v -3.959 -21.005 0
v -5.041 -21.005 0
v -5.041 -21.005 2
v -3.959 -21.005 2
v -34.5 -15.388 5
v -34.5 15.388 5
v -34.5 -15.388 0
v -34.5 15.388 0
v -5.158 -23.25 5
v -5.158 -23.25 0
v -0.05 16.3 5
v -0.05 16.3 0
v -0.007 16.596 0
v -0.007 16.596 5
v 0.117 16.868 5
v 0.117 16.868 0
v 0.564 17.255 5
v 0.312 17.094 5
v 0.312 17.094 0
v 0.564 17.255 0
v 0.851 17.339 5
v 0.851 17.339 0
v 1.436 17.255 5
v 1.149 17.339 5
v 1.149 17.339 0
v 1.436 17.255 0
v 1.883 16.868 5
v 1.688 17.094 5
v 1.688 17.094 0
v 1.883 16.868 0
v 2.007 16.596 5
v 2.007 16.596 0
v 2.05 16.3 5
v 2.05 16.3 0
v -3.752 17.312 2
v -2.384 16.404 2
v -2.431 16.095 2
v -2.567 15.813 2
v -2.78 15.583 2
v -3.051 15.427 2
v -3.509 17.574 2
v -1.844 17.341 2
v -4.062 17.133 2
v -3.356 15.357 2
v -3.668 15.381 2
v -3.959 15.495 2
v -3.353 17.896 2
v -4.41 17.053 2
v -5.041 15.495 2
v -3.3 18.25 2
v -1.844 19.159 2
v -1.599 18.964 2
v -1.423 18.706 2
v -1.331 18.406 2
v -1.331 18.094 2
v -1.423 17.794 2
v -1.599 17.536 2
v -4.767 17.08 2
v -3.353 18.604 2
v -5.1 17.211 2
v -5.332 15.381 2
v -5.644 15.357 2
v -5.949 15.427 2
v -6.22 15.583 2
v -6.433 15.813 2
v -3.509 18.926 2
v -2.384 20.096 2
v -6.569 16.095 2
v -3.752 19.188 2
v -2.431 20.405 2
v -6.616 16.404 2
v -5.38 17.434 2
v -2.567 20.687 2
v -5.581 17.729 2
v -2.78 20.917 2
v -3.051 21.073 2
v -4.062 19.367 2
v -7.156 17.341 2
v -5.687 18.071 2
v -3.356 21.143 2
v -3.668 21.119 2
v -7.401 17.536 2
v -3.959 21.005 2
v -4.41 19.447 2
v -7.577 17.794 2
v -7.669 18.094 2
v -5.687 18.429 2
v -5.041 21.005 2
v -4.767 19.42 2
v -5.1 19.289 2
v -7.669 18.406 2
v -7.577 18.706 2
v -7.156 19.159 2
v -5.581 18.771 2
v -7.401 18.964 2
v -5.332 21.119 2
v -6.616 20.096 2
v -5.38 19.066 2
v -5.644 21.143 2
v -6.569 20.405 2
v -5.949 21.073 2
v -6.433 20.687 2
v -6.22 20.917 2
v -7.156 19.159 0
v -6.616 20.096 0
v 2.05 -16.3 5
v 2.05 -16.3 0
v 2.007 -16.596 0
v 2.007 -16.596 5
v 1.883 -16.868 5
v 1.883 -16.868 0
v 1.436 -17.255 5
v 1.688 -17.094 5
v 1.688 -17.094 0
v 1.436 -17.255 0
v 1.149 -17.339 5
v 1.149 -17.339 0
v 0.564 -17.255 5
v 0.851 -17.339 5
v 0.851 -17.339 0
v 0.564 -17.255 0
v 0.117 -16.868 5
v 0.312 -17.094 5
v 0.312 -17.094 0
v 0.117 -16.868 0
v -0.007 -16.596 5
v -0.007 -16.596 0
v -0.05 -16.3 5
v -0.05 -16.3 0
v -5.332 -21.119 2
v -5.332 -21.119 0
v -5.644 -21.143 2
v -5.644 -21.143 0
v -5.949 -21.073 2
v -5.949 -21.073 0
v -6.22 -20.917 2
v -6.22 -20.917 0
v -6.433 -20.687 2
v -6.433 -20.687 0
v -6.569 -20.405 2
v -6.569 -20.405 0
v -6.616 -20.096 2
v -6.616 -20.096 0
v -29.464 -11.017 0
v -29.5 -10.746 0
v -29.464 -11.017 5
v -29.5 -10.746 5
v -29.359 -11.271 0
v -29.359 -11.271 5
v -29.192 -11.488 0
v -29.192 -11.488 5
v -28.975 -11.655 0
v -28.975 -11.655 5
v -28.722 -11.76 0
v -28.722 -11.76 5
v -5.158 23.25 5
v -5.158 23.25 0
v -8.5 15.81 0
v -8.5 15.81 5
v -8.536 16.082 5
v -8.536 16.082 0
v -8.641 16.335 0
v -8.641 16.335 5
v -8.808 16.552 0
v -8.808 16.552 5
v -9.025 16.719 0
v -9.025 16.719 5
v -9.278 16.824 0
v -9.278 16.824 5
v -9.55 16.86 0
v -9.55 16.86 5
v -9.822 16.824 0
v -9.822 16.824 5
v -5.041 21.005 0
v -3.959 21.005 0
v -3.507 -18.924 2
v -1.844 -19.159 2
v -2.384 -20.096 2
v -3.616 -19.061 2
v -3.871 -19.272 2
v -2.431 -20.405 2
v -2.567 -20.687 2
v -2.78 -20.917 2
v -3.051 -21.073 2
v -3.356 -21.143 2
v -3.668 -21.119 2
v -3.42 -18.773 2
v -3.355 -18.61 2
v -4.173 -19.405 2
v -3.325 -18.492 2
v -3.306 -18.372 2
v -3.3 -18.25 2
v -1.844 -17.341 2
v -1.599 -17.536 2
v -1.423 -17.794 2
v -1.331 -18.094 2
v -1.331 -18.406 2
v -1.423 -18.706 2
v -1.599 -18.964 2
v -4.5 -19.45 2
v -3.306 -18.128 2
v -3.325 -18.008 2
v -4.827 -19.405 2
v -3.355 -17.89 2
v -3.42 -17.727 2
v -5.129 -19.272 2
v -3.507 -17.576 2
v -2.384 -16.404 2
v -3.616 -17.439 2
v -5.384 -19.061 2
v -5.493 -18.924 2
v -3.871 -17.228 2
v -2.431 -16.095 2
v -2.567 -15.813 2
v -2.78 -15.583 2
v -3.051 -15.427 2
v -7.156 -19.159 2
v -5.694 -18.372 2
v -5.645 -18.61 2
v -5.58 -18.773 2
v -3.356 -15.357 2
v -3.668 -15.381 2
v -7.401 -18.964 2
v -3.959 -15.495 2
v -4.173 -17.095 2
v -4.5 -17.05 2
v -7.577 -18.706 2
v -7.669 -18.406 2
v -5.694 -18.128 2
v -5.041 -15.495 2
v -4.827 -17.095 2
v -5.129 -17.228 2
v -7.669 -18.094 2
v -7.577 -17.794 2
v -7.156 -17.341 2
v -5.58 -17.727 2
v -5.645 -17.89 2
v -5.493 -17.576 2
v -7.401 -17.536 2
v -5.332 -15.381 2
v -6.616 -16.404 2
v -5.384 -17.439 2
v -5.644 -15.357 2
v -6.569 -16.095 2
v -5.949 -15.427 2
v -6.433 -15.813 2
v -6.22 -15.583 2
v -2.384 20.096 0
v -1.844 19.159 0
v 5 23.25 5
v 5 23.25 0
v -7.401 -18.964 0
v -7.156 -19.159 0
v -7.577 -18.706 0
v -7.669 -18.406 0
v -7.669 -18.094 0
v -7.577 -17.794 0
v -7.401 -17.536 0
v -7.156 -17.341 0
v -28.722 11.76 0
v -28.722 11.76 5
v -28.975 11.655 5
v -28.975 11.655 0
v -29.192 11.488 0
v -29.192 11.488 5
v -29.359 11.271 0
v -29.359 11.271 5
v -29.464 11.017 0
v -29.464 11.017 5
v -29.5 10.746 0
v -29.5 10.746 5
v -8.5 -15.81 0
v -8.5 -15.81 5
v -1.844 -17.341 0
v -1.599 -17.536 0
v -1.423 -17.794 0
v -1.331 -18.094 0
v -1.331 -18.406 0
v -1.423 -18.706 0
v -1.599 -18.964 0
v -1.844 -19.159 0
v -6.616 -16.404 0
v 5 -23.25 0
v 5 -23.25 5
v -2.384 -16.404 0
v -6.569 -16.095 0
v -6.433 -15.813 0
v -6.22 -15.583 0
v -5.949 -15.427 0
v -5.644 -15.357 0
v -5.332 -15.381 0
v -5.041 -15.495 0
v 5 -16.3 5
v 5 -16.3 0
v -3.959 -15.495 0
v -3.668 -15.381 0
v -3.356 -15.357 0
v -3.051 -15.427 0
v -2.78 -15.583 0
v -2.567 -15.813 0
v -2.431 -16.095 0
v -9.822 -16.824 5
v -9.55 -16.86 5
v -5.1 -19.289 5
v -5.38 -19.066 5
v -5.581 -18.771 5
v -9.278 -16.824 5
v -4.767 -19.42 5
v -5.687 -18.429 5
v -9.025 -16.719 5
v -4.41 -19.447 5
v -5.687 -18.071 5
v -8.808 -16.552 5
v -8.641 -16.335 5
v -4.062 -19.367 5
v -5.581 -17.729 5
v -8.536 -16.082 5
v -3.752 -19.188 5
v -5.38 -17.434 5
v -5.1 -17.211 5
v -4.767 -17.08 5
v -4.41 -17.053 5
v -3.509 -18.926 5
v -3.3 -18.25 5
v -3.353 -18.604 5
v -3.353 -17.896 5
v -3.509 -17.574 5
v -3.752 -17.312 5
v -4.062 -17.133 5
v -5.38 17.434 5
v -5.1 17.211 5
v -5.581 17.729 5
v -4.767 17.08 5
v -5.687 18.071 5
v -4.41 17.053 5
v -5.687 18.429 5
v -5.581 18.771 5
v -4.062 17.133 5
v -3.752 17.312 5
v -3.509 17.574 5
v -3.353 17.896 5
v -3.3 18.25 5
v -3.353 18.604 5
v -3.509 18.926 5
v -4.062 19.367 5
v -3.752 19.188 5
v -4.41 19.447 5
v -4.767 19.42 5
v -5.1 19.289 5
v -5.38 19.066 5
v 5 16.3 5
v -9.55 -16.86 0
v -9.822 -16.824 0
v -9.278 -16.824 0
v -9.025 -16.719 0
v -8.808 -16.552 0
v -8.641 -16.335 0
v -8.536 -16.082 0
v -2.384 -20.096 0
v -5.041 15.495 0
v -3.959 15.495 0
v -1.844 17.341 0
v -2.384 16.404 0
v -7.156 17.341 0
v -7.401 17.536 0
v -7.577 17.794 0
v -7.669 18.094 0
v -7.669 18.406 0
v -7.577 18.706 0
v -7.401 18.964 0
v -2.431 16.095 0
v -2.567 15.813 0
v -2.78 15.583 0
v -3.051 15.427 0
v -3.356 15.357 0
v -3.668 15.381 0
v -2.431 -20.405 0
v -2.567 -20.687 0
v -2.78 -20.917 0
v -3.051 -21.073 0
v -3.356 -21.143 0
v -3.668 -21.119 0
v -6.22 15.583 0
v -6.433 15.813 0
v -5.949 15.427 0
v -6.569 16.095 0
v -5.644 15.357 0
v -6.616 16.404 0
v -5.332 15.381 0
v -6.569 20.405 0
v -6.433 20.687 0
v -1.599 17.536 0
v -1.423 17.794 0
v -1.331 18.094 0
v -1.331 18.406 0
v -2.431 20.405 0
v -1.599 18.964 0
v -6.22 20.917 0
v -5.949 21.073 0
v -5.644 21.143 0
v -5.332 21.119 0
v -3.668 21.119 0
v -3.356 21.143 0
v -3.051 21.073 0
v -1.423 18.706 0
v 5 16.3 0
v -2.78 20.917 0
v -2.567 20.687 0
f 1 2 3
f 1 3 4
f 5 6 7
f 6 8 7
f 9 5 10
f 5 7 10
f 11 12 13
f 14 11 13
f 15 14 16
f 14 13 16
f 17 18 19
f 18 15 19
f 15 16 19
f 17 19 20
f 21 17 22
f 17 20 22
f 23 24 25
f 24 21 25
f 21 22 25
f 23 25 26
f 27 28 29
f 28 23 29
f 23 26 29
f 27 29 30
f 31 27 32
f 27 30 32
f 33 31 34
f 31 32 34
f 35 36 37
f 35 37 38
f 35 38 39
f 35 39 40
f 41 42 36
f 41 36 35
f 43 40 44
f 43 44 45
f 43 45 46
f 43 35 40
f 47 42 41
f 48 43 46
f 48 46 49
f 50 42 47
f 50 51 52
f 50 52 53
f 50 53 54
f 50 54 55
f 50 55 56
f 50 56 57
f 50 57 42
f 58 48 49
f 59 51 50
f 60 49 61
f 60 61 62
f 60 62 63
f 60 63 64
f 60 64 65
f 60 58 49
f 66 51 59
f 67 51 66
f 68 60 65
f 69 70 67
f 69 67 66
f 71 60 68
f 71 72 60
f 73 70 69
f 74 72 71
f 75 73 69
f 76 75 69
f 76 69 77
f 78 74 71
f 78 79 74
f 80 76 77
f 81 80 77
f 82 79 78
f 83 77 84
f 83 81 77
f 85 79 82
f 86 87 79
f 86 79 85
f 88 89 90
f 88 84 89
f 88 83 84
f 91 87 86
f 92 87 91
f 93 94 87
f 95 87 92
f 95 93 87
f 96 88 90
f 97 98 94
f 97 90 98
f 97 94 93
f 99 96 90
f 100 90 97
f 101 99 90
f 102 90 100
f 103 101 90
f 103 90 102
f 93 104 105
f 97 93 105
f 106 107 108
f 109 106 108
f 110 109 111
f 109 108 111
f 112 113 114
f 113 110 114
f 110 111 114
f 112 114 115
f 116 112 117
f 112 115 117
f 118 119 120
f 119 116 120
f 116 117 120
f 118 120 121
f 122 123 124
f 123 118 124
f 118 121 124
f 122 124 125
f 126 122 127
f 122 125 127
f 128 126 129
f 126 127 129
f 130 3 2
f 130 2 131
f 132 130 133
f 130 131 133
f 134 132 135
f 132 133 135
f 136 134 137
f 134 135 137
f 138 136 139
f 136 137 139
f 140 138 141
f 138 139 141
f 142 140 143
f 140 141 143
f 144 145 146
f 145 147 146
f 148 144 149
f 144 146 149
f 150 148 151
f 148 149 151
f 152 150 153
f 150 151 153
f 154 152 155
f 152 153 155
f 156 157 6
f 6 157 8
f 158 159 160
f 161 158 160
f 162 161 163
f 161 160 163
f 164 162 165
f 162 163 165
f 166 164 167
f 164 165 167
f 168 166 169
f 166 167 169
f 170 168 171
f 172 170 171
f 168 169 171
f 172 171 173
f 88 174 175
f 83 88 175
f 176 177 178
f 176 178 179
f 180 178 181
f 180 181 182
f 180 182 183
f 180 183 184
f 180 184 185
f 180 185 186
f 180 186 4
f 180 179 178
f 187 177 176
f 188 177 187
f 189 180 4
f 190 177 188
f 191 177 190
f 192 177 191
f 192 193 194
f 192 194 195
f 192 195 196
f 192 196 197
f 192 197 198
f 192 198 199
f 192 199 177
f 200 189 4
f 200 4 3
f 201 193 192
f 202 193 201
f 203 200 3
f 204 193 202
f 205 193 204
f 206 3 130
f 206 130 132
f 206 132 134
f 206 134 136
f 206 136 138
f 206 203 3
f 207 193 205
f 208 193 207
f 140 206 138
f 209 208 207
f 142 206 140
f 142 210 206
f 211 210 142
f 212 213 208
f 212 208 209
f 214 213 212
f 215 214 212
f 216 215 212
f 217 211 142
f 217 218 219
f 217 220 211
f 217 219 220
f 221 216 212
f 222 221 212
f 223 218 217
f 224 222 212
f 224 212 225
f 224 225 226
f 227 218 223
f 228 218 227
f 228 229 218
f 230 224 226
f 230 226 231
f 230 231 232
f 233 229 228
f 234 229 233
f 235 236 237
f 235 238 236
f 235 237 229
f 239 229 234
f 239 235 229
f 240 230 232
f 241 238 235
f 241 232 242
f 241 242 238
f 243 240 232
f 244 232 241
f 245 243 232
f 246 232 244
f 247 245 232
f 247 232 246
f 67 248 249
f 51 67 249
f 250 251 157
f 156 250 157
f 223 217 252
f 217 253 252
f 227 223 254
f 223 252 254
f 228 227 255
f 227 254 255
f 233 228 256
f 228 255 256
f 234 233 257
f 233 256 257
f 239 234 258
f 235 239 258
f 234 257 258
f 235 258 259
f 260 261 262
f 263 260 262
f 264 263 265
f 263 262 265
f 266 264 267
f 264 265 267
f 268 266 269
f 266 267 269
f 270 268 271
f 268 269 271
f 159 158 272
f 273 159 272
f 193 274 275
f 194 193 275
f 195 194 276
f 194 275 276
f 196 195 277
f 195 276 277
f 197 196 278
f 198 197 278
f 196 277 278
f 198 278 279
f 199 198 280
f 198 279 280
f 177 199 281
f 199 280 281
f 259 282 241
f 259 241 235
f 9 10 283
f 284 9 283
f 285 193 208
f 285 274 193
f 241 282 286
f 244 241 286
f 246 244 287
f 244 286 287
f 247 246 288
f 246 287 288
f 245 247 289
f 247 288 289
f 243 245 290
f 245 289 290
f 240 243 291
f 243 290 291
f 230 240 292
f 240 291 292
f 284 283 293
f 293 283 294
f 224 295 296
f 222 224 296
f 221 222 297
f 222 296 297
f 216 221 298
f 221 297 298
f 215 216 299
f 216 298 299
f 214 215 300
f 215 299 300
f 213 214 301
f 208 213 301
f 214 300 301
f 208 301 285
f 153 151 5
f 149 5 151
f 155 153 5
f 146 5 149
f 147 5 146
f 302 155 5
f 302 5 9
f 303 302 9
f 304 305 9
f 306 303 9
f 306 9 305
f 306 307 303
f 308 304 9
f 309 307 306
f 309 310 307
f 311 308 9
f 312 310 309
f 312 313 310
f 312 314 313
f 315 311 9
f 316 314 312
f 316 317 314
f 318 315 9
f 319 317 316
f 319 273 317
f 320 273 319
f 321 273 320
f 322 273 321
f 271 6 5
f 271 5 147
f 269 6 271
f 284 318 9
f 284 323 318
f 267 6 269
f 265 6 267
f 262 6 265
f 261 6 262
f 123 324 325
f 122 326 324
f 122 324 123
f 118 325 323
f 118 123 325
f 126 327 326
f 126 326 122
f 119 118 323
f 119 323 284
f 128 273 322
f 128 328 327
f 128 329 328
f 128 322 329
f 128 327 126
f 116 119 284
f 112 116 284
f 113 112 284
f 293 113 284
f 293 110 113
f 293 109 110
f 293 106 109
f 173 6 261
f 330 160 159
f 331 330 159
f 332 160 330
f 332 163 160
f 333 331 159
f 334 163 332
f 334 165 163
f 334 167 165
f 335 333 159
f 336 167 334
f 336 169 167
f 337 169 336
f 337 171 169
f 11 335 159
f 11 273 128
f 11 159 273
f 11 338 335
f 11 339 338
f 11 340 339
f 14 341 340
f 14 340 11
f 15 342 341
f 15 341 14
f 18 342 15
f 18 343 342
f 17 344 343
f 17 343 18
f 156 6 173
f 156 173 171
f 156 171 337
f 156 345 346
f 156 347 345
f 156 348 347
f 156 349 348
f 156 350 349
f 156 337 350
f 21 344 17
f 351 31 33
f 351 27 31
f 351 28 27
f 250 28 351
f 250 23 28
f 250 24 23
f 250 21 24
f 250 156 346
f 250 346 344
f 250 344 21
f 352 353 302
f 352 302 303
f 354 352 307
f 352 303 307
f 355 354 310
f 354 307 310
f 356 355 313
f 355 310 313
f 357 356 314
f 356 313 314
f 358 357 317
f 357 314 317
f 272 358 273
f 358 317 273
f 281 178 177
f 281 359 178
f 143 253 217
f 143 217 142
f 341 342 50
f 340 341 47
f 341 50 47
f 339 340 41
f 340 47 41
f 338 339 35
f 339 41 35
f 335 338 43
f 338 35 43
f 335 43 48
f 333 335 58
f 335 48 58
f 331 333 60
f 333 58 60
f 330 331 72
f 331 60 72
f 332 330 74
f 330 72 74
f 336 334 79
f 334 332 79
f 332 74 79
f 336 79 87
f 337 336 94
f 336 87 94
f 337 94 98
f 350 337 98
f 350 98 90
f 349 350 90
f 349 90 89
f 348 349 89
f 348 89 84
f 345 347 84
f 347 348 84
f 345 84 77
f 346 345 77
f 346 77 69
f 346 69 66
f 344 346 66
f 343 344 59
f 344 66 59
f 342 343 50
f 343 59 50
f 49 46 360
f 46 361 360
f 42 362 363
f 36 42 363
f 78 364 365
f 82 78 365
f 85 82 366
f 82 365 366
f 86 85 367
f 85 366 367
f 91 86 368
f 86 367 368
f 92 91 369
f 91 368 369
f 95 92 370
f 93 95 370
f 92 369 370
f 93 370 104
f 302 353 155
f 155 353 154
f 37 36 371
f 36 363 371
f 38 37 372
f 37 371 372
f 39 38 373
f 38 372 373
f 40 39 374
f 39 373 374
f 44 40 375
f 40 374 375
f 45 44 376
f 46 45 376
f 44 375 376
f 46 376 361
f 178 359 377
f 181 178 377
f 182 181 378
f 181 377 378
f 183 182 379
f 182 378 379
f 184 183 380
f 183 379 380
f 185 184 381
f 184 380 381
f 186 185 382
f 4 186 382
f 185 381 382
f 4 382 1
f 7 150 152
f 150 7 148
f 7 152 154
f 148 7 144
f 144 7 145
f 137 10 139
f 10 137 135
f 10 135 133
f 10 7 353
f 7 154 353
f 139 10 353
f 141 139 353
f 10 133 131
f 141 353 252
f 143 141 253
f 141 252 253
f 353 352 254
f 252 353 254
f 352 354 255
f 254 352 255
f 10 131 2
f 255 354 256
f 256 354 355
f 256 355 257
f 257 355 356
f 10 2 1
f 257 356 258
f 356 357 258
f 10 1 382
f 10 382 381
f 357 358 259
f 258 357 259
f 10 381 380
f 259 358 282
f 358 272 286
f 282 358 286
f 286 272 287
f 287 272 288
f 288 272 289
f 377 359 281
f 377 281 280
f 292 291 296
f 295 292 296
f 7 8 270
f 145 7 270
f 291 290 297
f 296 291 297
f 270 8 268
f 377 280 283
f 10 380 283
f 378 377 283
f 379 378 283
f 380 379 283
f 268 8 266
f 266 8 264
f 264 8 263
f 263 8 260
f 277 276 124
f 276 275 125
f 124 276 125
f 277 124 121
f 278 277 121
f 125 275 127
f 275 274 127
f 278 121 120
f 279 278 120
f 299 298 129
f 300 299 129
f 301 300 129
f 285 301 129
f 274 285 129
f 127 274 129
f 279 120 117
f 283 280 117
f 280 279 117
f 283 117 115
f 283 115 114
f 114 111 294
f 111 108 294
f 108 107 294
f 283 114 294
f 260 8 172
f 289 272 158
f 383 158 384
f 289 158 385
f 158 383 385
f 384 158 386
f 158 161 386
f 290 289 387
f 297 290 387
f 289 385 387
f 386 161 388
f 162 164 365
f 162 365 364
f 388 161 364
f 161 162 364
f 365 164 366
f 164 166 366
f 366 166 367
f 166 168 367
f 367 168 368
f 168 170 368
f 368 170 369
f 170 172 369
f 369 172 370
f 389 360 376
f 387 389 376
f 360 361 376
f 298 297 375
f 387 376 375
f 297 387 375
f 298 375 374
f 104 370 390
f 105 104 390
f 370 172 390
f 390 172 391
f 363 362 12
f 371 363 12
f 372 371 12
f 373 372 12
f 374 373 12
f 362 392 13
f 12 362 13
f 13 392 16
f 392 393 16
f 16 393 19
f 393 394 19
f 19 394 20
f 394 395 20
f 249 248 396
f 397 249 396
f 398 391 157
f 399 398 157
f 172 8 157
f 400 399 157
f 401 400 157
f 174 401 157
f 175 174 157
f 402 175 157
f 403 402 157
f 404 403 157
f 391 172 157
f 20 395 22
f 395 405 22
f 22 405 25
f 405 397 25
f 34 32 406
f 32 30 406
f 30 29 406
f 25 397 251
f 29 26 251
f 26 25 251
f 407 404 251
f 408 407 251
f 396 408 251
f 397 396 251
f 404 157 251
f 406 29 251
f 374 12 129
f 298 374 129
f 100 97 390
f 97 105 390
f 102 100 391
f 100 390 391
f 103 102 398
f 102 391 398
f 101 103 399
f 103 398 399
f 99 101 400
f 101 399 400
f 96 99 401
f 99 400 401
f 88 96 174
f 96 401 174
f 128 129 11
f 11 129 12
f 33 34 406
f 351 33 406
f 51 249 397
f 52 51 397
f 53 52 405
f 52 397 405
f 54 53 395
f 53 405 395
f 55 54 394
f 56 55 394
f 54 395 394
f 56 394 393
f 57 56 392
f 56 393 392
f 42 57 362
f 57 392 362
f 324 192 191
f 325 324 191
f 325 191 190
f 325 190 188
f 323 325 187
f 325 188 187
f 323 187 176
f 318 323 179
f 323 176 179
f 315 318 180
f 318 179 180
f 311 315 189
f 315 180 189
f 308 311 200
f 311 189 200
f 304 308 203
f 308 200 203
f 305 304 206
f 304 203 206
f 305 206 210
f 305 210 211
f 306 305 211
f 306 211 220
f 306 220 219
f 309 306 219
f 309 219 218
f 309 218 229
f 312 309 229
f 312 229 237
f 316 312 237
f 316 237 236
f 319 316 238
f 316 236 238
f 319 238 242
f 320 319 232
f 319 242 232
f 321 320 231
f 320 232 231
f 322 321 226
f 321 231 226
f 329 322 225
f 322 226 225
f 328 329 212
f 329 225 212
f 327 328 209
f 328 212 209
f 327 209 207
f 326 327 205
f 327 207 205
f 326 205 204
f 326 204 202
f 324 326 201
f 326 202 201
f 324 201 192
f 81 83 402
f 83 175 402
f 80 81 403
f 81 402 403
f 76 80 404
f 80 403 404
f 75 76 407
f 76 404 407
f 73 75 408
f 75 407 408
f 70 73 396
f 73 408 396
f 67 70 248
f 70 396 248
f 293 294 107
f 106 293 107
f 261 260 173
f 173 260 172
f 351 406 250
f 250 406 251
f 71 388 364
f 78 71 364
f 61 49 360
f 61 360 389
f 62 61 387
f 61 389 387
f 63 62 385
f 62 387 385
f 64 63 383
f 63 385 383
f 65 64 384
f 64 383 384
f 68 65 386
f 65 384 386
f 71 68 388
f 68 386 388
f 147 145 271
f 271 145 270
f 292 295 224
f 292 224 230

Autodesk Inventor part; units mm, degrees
ref_plane "YZ Plane" through (0, 0, 0) normal (1, 0, 0) x (0, 1, 0)
ref_plane "XZ Plane" through (0, 0, 0) normal (0, 1, 0) x (-1, 0, 0)
ref_plane "XY Plane" through (0, 0, 0) normal (0, 0, 1) x (1, 0, 0)
sketch "スケッチ1" plane through (0, 0, 0) normal (0, 0, 1) x (1, 0, 0)
  line L0 (0, 16.25) -> (28.465632, 16.25) construction
  line L1 (28.465632, 16.25) -> (28.465632, -16.25) construction
  line L2 (28.465632, -16.25) -> (0, -16.25) construction
  line L3 (0, -16.25) -> (0, 16.25) construction
  line L4 (5, 23.25) -> (-5.158262, 23.25)
  line L5 (-5.158262, 23.25) -> (-34.5, 15.387905)
  line L6 (-34.5, 15.387905) -> (-34.5, -15.387905)
  line L7 (-34.5, -15.387905) -> (-5.158262, -23.25)
  line L8 (-5.158262, -23.25) -> (5, -23.25)
  line L9 (5, -23.25) -> (5, -16.3)
  line L10 (5, -16.3) -> (2.05, -16.3)
  arc A0 (-0.05, -16.3) -> (2.05, -16.3) centre (1, -16.3) ccw
  line L11 (-0.05, -16.3) -> (-0.05, 16.3)
  arc A1 (2.05, 16.3) -> (-0.05, 16.3) centre (1, 16.3) ccw
  line L12 (28.465632, 0) -> (0, 0) construction
  line L13 (2.05, 16.3) -> (5, 16.3)
  line L14 (5, 16.3) -> (5, 23.25)
  line L15 (28.515632, 16.3) -> (-0.05, 16.3) construction
  line L16 (-0.05, 16.3) -> (-0.05, -16.3) construction
  line L17 (-0.05, -16.3) -> (28.515632, -16.3) construction
  line L18 (28.515632, -16.3) -> (28.515632, 16.3) construction
  circle A2 centre (-4.5, 18.25) radius 1.2
  circle A3 centre (-4.5, -18.25) radius 1.2
  line L19 (0, 0) -> (28.465632, 0) construction
  line L20 (2.5, 16.25) -> (2.5, -16.25) construction
  circle A4 centre (-4.5, 18.25) radius 5 construction
  line L21 (-6.087713, 15.5) -> (-7.675426, 18.25)
  line L22 (-7.675426, 18.25) -> (-6.087713, 21)
  line L23 (-6.087713, 21) -> (-2.912287, 21)
  line L24 (-2.912287, 21) -> (-1.324574, 18.25)
  line L25 (-1.324574, 18.25) -> (-2.912287, 15.5)
  line L26 (-2.912287, 15.5) -> (-6.087713, 15.5)
  point P0 (-34.5, 0)
  point P1 (-0.05, 0)
  dimension "d98" = 32.5
  dimension "d100" = 0.05
  dimension "d101" = 1.05
  dimension "d102" = 5
  dimension "d104" = 2.4
  dimension "d106" = 2.5
  dimension "d107" = 7
  dimension "d108" = 18.25
  dimension "d109" = 5
  dimension "d110" = 30
  dimension "d111" = 165
  dimension "d130" = 5.5
extrude "押し出し1" add sketch "スケッチ1" along normal blind 5 contours L14 L13 A1 L11 A0 L10 L9 L8 L7 L6 L5 L4 | L21 L22 L23 L24 L25 L26
sketch "スケッチ6" plane through (0, 0, 0) normal (0, 0, -1) x (-1, 0, 0)
  line L0 (34.5, -15.387905) -> (5.158262, -23.25)
  line L1 (34.5, 15.387905) -> (34.5, -15.387905)
  line L2 (5.158262, 23.25) -> (34.5, 15.387905)
  line L3 (8.5, 17.178203) -> (8.5, -17.178203)
  line L4 (8.5, -17.178203) -> (29.5, -11.55127)
  line L5 (29.5, -11.55127) -> (29.5, 11.55127)
  line L6 (29.5, 11.55127) -> (8.5, 17.178203)
  circle A0 centre (4.5, 18.25) radius 1.2
  point P0 (0, 0)
  dimension "d113" = 5
  dimension "d114" = 5
  dimension "d115" = 5
  dimension "d133" = 4
extrude "押し出し4" cut sketch "スケッチ6" against normal blind 5 contours L6 L5 L4 L3
fillet "フィレット2" radius 1.05 4 edges at (-8.5, 17.1782, 2.5) (-8.5, -17.1782, 2.5) (-29.5, 11.5513, 2.5) (-29.5, -11.5513, 2.5)
sketch "スケッチ7" plane through (0, 0, 0) normal (0, 0, -1) x (-1, 0, 0)
  circle A0 centre (4.5, -18.25) radius 1.2
  circle A1 centre (4.5, 18.25) radius 1.2
  line L0 (2.912287, 15.5) -> (1.324574, 18.25)
  line L1 (1.324574, 18.25) -> (2.912287, 21)
  line L2 (2.912287, 21) -> (6.087713, 21)
  line L3 (6.087713, 21) -> (7.675426, 18.25)
  line L4 (7.675426, 18.25) -> (6.087713, 15.5)
  line L5 (6.087713, 15.5) -> (2.912287, 15.5)
  line L6 (7.6812, 18.25) -> (6.0906, 21.005)
  line L7 (6.0906, 21.005) -> (2.9094, 21.005)
  line L8 (2.9094, 21.005) -> (1.3188, 18.25)
  line L9 (1.3188, 18.25) -> (2.9094, 15.495)
  line L10 (2.9094, 15.495) -> (6.0906, 15.495)
  line L11 (6.0906, 15.495) -> (7.6812, 18.25)
  circle A2 centre (6.6312, 18.25) radius 1.05
  circle A3 centre (5.5656, 20.095673) radius 1.05
  circle A4 centre (3.4344, 20.095673) radius 1.05
  circle A5 centre (2.3688, 18.25) radius 1.05
  circle A6 centre (3.4344, 16.404327) radius 1.05
  circle A7 centre (5.5656, 16.404327) radius 1.05
  line L12 (7.6812, -18.25) -> (6.0906, -21.005)
  line L13 (6.0906, -21.005) -> (2.9094, -21.005)
  line L14 (2.9094, -21.005) -> (1.3188, -18.25)
  line L15 (1.3188, -18.25) -> (2.9094, -15.495)
  line L16 (2.9094, -15.495) -> (6.0906, -15.495)
  line L17 (6.0906, -15.495) -> (7.6812, -18.25)
  circle A8 centre (6.6312, -18.25) radius 1.05
  circle A9 centre (5.5656, -16.404327) radius 1.05
  circle A10 centre (3.4344, -16.404327) radius 1.05
  circle A11 centre (2.3688, -18.25) radius 1.05
  circle A12 centre (3.4344, -20.095673) radius 1.05
  circle A13 centre (5.5656, -20.095673) radius 1.05
  point P0 (0, 0)
  point P1 (6.0906, 21.005)
  point P2 (2.9094, 21.005)
  point P3 (1.3188, 18.25)
  point P4 (2.9094, 15.495)
  point P5 (6.0906, 15.495)
  point P6 (2.9094, -15.495)
  point P7 (2.9094, -21.005)
  point P8 (6.0906, -21.005)
  dimension "d121" = 2.1
  dimension "d119" = 5.5
  dimension "d120" = 0.005
  dimension "d124" = 360
  dimension "d128" = 360
sketch "スケッチ7 outline for 押し出し5" plane through (0, 0, 0) normal (0, 0, -1) x (-1, 0, 0)
  arc A0 (6.6156, 20.095673) -> (5.0406, 21.005) centre (5.5656, 20.095673) ccw
  line L0 (5.0406, 21.005) -> (3.9594, 21.005)
  arc A1 (3.9594, 21.005) -> (2.3844, 20.095673) centre (3.4344, 20.095673) ccw
  line L1 (2.3844, 20.095673) -> (1.8438, 19.159327)
  arc A2 (1.8438, 19.159327) -> (1.8438, 17.340673) centre (2.3688, 18.25) ccw
  line L2 (1.8438, 17.340673) -> (2.3844, 16.404327)
  arc A3 (2.3844, 16.404327) -> (3.9594, 15.495) centre (3.4344, 16.404327) ccw
  line L3 (3.9594, 15.495) -> (5.0406, 15.495)
  arc A4 (5.0406, 15.495) -> (6.6156, 16.404327) centre (5.5656, 16.404327) ccw
  line L4 (6.6156, 16.404327) -> (7.1562, 17.340673)
  arc A5 (7.1562, 17.340673) -> (7.1562, 19.159327) centre (6.6312, 18.25) ccw
  line L5 (7.1562, 19.159327) -> (6.6156, 20.095673)
  arc A6 (6.6156, -16.404327) -> (5.0406, -15.495) centre (5.5656, -16.404327) ccw
  line L6 (3.9594, -15.495) -> (5.0406, -15.495)
  arc A7 (3.9594, -15.495) -> (2.3844, -16.404327) centre (3.4344, -16.404327) ccw
  line L7 (1.8438, -17.340673) -> (2.3844, -16.404327)
  arc A8 (1.8438, -17.340673) -> (1.8438, -19.159327) centre (2.3688, -18.25) ccw
  line L8 (2.3844, -20.095673) -> (1.8438, -19.159327)
  arc A9 (2.3844, -20.095673) -> (3.9594, -21.005) centre (3.4344, -20.095673) ccw
  line L9 (5.0406, -21.005) -> (3.9594, -21.005)
  arc A10 (5.0406, -21.005) -> (6.6156, -20.095673) centre (5.5656, -20.095673) ccw
  line L10 (7.1562, -19.159327) -> (6.6156, -20.095673)
  arc A11 (7.1562, -19.159327) -> (7.1562, -17.340673) centre (6.6312, -18.25) ccw
  line L11 (6.6156, -16.404327) -> (7.1562, -17.340673)
  arc A12 (5.644781, -17.890171) -> (5.384012, -17.438505) centre (4.5, -18.25) ccw
  arc A13 (5.644781, -17.890171) -> (5.644781, -18.609829) centre (6.6312, -18.25) ccw
  arc A14 (5.384012, -19.061495) -> (5.644781, -18.609829) centre (4.5, -18.25) ccw
  arc A15 (5.384012, -19.061495) -> (4.760769, -19.421324) centre (5.5656, -20.095673) ccw
  arc A16 (4.239231, -19.421324) -> (4.760769, -19.421324) centre (4.5, -18.25) ccw
  arc A17 (4.239231, -19.421324) -> (3.615988, -19.061495) centre (3.4344, -20.095673) ccw
  arc A18 (3.355219, -18.609829) -> (3.615988, -19.061495) centre (4.5, -18.25) ccw
  arc A19 (3.355219, -18.609829) -> (3.355219, -17.890171) centre (2.3688, -18.25) ccw
  arc A20 (3.615988, -17.438505) -> (3.355219, -17.890171) centre (4.5, -18.25) ccw
  arc A21 (3.615988, -17.438505) -> (4.239231, -17.078676) centre (3.4344, -16.404327) ccw
  arc A22 (4.760769, -17.078676) -> (4.239231, -17.078676) centre (4.5, -18.25) ccw
  arc A23 (4.760769, -17.078676) -> (5.384012, -17.438505) centre (5.5656, -16.404327) ccw
extrude "押し出し5" cut sketch "スケッチ7 outline for 押し出し5" against normal blind 2
sketch "スケッチ8" plane through (0, 0, 5) normal (0, 0, 1) x (1, 0, 0)
  point P0 (0, 0)
equation "\"d114\" = d113"
equation "\"d115\" = d113"
properties part number "バンパ-" material "アセタール樹脂、黒"
